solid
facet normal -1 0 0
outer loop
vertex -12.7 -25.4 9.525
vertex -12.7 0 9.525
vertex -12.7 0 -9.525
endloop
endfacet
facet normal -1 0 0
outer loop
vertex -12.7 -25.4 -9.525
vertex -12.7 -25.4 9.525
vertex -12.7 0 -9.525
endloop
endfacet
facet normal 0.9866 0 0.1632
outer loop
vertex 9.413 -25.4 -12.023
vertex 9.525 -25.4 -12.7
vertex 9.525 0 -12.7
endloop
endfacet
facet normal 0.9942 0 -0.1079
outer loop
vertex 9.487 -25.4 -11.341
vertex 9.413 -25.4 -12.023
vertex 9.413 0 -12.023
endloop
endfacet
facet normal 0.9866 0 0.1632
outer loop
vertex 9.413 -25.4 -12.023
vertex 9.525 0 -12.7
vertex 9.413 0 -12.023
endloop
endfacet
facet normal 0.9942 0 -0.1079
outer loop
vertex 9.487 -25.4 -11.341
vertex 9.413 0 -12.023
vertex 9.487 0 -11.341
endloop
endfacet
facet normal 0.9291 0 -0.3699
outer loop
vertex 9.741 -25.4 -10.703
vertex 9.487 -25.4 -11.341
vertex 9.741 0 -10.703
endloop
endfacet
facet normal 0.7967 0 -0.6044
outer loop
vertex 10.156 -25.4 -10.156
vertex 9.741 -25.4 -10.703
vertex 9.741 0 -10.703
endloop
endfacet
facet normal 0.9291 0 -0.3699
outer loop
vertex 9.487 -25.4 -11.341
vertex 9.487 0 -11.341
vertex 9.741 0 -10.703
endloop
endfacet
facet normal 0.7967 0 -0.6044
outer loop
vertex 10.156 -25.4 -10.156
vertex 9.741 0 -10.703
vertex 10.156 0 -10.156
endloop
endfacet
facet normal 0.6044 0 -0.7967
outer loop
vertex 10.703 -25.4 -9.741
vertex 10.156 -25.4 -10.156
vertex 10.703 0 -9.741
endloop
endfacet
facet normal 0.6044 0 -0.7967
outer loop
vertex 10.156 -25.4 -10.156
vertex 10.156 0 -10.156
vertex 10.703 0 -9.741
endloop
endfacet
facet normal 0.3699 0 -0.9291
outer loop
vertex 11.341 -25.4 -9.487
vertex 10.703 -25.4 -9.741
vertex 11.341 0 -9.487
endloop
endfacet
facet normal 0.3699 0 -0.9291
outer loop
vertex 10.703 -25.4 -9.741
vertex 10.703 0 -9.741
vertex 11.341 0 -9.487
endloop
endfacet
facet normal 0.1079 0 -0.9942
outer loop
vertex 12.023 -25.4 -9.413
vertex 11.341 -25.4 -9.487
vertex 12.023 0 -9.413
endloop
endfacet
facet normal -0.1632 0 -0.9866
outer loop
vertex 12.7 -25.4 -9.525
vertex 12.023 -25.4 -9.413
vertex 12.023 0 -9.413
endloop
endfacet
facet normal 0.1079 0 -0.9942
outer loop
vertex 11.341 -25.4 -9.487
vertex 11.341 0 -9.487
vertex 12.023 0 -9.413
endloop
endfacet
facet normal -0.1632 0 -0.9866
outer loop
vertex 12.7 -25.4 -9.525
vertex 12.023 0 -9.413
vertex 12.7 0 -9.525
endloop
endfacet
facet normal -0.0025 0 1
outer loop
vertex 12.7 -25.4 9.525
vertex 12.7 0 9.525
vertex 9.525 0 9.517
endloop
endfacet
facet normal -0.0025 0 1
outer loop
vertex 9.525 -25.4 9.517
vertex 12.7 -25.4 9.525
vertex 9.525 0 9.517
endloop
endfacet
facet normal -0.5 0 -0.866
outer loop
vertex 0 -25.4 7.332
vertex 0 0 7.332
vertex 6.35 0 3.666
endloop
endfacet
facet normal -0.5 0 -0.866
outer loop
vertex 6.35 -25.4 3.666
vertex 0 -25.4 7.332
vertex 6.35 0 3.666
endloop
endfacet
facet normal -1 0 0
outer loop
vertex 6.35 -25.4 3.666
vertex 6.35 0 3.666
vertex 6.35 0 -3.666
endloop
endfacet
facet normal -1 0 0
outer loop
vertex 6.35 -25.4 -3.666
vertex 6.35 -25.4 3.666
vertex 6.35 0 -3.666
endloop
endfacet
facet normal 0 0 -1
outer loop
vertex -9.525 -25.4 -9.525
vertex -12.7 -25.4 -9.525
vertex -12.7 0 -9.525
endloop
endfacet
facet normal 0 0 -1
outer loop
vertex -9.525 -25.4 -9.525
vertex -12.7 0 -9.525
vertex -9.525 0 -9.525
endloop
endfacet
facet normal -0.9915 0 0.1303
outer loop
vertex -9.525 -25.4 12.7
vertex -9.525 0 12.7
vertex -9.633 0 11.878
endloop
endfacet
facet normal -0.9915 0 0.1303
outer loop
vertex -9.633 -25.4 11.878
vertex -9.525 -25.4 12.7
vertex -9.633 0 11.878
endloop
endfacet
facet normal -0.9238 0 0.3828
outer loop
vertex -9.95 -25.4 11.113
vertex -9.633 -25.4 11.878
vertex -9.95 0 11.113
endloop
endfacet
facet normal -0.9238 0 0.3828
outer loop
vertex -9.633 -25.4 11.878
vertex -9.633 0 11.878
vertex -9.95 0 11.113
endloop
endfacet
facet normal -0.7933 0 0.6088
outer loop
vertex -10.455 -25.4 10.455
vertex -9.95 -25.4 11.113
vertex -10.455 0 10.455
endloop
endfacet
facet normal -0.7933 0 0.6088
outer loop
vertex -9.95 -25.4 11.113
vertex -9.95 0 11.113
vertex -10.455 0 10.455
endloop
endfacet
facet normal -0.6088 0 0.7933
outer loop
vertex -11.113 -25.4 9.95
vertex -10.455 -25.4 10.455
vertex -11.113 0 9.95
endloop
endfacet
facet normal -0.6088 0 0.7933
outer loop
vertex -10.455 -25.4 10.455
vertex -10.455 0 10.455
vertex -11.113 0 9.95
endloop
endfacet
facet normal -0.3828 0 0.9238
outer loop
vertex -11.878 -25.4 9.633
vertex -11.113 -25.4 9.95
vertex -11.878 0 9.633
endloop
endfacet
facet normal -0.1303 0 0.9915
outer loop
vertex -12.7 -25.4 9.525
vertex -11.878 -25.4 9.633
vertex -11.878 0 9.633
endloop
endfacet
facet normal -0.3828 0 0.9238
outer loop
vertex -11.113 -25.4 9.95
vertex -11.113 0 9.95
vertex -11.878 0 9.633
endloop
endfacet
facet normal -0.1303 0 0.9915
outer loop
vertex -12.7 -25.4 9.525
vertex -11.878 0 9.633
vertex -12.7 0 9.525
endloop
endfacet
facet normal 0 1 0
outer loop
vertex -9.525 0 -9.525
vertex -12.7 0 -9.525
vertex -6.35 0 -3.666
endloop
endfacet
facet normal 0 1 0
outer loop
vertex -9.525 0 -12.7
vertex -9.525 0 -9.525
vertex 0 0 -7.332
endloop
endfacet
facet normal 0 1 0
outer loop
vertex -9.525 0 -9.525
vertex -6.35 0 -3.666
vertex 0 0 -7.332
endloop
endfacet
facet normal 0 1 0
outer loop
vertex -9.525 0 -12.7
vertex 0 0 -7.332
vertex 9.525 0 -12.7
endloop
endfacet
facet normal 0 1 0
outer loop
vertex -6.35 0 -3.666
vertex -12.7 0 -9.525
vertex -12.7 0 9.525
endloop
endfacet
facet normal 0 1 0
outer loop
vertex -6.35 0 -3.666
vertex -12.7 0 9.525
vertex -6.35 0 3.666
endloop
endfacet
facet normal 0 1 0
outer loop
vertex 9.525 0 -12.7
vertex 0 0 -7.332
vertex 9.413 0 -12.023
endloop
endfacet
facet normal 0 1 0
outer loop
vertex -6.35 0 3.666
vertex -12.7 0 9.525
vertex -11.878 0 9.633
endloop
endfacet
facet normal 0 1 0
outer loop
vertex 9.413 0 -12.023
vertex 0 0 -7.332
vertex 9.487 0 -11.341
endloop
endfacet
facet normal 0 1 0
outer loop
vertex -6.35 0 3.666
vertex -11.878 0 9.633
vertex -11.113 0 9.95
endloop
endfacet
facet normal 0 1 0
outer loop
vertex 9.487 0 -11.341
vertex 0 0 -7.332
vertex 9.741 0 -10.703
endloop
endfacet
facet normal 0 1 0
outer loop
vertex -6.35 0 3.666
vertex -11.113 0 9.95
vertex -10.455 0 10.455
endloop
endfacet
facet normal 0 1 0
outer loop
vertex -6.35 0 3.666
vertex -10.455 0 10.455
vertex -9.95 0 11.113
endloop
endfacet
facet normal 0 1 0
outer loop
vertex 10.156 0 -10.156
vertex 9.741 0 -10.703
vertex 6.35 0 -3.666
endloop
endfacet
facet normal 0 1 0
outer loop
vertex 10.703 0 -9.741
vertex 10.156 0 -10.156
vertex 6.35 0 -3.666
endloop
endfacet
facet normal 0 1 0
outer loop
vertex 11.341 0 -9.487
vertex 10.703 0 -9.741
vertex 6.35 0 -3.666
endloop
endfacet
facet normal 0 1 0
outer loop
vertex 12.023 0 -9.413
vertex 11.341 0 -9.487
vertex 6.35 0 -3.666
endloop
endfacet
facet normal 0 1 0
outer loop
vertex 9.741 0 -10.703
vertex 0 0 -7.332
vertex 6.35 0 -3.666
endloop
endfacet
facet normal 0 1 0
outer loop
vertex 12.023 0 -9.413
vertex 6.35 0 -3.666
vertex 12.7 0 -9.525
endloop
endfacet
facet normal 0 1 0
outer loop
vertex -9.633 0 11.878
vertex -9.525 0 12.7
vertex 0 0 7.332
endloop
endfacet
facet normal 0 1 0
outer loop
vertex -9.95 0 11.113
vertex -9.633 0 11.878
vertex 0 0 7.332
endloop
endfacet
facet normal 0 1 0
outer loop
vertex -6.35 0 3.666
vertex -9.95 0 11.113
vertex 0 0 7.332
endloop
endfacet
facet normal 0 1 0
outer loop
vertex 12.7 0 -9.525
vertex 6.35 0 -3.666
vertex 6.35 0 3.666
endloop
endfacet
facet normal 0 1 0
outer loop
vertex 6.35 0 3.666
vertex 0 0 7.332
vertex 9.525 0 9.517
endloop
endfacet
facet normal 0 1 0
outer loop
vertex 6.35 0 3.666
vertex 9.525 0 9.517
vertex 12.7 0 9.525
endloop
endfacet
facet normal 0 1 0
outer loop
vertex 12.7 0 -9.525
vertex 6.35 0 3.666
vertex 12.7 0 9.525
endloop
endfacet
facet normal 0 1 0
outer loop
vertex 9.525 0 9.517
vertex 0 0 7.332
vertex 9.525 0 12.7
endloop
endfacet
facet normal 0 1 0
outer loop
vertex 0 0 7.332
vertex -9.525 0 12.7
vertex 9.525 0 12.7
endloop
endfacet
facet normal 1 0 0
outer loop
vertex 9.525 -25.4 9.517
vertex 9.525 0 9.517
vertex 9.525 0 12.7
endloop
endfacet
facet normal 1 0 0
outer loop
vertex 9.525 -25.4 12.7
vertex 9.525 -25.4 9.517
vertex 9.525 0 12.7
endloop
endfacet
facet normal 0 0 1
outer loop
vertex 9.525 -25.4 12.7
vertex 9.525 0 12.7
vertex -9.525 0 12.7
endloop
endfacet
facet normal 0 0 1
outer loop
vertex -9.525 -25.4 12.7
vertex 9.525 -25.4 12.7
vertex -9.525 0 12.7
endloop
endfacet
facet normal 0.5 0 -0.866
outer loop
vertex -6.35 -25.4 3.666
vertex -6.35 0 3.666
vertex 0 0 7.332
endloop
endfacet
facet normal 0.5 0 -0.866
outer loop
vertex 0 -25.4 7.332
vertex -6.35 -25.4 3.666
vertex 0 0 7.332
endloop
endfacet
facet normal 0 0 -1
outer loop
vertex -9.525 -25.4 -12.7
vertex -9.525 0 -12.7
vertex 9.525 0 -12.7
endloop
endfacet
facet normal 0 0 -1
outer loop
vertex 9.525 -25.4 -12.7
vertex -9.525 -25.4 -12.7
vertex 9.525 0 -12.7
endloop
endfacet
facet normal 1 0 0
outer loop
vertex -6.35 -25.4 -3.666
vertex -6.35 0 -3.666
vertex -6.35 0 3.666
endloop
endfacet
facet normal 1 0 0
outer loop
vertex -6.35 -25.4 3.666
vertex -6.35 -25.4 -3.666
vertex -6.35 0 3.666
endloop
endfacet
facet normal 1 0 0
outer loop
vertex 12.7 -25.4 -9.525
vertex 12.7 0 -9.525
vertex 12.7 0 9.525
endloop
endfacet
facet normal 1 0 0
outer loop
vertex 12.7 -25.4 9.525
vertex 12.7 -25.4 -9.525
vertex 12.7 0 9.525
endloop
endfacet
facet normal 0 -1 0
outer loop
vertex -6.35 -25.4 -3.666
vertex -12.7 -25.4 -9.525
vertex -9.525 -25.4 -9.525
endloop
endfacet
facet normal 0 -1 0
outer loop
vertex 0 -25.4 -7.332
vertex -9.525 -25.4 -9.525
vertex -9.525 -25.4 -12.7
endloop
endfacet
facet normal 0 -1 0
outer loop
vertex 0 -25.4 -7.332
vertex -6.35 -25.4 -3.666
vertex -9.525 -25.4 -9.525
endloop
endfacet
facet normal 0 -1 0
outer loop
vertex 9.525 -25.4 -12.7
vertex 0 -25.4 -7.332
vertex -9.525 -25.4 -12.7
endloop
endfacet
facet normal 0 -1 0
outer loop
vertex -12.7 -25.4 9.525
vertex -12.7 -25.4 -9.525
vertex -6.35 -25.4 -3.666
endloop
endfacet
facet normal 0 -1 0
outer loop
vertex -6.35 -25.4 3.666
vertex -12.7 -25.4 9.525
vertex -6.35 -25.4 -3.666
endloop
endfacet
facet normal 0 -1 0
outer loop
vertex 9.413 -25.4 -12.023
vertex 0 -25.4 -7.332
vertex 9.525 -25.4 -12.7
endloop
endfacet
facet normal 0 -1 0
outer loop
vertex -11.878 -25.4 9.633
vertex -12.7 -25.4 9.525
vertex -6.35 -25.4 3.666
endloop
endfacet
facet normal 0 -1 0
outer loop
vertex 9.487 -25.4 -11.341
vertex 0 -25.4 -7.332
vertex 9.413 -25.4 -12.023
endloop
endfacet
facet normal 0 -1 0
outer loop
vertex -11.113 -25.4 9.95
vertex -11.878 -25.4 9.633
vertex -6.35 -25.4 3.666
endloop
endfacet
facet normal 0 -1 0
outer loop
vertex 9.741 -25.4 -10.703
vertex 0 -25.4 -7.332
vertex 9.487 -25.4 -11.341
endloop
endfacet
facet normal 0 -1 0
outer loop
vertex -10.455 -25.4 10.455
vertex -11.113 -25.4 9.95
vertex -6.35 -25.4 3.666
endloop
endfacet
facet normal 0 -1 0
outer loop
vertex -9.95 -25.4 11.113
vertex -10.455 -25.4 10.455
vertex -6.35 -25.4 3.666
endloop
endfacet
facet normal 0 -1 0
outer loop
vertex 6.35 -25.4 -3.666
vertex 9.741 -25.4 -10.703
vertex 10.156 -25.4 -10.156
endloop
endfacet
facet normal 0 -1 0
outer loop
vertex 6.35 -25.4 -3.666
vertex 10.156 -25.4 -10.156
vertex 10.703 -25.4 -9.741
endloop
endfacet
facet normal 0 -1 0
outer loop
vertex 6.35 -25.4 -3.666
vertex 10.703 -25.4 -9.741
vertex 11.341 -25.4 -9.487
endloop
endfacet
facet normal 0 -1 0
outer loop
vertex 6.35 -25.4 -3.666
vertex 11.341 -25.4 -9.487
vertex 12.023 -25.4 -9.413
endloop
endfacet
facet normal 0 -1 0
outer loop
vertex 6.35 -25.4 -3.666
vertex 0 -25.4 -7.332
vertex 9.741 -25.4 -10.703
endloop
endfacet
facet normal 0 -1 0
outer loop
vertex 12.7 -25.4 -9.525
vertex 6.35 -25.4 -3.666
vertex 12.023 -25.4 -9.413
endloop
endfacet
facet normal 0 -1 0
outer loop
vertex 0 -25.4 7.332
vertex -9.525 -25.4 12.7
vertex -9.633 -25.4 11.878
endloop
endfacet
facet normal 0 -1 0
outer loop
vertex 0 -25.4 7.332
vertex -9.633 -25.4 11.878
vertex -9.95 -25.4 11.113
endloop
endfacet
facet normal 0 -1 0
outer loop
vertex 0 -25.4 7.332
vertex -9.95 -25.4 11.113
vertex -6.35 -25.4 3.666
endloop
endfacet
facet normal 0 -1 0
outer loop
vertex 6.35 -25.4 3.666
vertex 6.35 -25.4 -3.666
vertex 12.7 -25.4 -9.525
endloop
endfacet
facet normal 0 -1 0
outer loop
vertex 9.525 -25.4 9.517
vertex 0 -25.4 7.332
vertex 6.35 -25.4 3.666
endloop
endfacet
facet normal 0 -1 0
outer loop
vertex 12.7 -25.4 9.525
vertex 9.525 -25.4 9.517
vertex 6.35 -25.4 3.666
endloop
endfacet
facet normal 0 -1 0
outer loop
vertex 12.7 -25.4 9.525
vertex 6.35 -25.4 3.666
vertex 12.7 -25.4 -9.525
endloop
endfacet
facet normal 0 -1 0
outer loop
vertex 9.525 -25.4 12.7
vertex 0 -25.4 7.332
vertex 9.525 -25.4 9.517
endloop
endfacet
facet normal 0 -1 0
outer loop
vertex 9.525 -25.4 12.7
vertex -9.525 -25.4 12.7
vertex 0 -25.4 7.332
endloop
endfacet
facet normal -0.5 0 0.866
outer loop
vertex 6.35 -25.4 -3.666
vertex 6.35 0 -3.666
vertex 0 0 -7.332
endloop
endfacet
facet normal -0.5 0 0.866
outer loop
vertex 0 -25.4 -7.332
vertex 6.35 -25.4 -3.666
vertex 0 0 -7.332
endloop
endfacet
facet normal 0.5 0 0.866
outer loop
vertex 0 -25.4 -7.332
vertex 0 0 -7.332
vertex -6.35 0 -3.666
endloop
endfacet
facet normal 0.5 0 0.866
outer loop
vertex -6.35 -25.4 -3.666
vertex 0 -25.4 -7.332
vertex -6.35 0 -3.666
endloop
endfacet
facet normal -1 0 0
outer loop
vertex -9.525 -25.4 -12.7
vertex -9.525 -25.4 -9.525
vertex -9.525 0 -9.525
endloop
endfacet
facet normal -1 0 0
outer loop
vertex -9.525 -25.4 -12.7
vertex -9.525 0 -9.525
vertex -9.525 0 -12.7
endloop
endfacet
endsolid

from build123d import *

# Parameters (mm, degrees)
F1_DEPTH = 25.4


with BuildPart() as f1:
    # F0 (on Front) → F1 (new body)
    with BuildSketch(Plane.XZ):
        with BuildLine():
            Line((-9.525, -12.7), (9.525, -12.7))
            ThreePointArc((9.525, -12.7), (10.156475, -10.156475), (12.7, -9.525))
            Line((12.7, -9.525), (12.7, 9.525))
            Line((12.7, 9.525), (9.525, 9.516916))
            Line((9.525, 9.516916), (9.525, 12.7))
            Line((9.525, 12.7), (-9.525, 12.7))
            ThreePointArc((-9.525, 12.7), (-10.454936, 10.454936), (-12.7, 9.525))
            Line((-12.7, 9.525), (-12.7, -9.525))
            Line((-12.7, -9.525), (-9.525, -9.525))
            Line((-9.525, -9.525), (-9.525, -12.7))
        make_face()
        Polygon((6.35, 3.666174), (6.35, -3.666174), (0, -7.332348), (-6.35, -3.666174), (-6.35, 3.666174), (0, 7.332348), align=None, mode=Mode.SUBTRACT)
    extrude(amount=F1_DEPTH)


solid = f1.part
